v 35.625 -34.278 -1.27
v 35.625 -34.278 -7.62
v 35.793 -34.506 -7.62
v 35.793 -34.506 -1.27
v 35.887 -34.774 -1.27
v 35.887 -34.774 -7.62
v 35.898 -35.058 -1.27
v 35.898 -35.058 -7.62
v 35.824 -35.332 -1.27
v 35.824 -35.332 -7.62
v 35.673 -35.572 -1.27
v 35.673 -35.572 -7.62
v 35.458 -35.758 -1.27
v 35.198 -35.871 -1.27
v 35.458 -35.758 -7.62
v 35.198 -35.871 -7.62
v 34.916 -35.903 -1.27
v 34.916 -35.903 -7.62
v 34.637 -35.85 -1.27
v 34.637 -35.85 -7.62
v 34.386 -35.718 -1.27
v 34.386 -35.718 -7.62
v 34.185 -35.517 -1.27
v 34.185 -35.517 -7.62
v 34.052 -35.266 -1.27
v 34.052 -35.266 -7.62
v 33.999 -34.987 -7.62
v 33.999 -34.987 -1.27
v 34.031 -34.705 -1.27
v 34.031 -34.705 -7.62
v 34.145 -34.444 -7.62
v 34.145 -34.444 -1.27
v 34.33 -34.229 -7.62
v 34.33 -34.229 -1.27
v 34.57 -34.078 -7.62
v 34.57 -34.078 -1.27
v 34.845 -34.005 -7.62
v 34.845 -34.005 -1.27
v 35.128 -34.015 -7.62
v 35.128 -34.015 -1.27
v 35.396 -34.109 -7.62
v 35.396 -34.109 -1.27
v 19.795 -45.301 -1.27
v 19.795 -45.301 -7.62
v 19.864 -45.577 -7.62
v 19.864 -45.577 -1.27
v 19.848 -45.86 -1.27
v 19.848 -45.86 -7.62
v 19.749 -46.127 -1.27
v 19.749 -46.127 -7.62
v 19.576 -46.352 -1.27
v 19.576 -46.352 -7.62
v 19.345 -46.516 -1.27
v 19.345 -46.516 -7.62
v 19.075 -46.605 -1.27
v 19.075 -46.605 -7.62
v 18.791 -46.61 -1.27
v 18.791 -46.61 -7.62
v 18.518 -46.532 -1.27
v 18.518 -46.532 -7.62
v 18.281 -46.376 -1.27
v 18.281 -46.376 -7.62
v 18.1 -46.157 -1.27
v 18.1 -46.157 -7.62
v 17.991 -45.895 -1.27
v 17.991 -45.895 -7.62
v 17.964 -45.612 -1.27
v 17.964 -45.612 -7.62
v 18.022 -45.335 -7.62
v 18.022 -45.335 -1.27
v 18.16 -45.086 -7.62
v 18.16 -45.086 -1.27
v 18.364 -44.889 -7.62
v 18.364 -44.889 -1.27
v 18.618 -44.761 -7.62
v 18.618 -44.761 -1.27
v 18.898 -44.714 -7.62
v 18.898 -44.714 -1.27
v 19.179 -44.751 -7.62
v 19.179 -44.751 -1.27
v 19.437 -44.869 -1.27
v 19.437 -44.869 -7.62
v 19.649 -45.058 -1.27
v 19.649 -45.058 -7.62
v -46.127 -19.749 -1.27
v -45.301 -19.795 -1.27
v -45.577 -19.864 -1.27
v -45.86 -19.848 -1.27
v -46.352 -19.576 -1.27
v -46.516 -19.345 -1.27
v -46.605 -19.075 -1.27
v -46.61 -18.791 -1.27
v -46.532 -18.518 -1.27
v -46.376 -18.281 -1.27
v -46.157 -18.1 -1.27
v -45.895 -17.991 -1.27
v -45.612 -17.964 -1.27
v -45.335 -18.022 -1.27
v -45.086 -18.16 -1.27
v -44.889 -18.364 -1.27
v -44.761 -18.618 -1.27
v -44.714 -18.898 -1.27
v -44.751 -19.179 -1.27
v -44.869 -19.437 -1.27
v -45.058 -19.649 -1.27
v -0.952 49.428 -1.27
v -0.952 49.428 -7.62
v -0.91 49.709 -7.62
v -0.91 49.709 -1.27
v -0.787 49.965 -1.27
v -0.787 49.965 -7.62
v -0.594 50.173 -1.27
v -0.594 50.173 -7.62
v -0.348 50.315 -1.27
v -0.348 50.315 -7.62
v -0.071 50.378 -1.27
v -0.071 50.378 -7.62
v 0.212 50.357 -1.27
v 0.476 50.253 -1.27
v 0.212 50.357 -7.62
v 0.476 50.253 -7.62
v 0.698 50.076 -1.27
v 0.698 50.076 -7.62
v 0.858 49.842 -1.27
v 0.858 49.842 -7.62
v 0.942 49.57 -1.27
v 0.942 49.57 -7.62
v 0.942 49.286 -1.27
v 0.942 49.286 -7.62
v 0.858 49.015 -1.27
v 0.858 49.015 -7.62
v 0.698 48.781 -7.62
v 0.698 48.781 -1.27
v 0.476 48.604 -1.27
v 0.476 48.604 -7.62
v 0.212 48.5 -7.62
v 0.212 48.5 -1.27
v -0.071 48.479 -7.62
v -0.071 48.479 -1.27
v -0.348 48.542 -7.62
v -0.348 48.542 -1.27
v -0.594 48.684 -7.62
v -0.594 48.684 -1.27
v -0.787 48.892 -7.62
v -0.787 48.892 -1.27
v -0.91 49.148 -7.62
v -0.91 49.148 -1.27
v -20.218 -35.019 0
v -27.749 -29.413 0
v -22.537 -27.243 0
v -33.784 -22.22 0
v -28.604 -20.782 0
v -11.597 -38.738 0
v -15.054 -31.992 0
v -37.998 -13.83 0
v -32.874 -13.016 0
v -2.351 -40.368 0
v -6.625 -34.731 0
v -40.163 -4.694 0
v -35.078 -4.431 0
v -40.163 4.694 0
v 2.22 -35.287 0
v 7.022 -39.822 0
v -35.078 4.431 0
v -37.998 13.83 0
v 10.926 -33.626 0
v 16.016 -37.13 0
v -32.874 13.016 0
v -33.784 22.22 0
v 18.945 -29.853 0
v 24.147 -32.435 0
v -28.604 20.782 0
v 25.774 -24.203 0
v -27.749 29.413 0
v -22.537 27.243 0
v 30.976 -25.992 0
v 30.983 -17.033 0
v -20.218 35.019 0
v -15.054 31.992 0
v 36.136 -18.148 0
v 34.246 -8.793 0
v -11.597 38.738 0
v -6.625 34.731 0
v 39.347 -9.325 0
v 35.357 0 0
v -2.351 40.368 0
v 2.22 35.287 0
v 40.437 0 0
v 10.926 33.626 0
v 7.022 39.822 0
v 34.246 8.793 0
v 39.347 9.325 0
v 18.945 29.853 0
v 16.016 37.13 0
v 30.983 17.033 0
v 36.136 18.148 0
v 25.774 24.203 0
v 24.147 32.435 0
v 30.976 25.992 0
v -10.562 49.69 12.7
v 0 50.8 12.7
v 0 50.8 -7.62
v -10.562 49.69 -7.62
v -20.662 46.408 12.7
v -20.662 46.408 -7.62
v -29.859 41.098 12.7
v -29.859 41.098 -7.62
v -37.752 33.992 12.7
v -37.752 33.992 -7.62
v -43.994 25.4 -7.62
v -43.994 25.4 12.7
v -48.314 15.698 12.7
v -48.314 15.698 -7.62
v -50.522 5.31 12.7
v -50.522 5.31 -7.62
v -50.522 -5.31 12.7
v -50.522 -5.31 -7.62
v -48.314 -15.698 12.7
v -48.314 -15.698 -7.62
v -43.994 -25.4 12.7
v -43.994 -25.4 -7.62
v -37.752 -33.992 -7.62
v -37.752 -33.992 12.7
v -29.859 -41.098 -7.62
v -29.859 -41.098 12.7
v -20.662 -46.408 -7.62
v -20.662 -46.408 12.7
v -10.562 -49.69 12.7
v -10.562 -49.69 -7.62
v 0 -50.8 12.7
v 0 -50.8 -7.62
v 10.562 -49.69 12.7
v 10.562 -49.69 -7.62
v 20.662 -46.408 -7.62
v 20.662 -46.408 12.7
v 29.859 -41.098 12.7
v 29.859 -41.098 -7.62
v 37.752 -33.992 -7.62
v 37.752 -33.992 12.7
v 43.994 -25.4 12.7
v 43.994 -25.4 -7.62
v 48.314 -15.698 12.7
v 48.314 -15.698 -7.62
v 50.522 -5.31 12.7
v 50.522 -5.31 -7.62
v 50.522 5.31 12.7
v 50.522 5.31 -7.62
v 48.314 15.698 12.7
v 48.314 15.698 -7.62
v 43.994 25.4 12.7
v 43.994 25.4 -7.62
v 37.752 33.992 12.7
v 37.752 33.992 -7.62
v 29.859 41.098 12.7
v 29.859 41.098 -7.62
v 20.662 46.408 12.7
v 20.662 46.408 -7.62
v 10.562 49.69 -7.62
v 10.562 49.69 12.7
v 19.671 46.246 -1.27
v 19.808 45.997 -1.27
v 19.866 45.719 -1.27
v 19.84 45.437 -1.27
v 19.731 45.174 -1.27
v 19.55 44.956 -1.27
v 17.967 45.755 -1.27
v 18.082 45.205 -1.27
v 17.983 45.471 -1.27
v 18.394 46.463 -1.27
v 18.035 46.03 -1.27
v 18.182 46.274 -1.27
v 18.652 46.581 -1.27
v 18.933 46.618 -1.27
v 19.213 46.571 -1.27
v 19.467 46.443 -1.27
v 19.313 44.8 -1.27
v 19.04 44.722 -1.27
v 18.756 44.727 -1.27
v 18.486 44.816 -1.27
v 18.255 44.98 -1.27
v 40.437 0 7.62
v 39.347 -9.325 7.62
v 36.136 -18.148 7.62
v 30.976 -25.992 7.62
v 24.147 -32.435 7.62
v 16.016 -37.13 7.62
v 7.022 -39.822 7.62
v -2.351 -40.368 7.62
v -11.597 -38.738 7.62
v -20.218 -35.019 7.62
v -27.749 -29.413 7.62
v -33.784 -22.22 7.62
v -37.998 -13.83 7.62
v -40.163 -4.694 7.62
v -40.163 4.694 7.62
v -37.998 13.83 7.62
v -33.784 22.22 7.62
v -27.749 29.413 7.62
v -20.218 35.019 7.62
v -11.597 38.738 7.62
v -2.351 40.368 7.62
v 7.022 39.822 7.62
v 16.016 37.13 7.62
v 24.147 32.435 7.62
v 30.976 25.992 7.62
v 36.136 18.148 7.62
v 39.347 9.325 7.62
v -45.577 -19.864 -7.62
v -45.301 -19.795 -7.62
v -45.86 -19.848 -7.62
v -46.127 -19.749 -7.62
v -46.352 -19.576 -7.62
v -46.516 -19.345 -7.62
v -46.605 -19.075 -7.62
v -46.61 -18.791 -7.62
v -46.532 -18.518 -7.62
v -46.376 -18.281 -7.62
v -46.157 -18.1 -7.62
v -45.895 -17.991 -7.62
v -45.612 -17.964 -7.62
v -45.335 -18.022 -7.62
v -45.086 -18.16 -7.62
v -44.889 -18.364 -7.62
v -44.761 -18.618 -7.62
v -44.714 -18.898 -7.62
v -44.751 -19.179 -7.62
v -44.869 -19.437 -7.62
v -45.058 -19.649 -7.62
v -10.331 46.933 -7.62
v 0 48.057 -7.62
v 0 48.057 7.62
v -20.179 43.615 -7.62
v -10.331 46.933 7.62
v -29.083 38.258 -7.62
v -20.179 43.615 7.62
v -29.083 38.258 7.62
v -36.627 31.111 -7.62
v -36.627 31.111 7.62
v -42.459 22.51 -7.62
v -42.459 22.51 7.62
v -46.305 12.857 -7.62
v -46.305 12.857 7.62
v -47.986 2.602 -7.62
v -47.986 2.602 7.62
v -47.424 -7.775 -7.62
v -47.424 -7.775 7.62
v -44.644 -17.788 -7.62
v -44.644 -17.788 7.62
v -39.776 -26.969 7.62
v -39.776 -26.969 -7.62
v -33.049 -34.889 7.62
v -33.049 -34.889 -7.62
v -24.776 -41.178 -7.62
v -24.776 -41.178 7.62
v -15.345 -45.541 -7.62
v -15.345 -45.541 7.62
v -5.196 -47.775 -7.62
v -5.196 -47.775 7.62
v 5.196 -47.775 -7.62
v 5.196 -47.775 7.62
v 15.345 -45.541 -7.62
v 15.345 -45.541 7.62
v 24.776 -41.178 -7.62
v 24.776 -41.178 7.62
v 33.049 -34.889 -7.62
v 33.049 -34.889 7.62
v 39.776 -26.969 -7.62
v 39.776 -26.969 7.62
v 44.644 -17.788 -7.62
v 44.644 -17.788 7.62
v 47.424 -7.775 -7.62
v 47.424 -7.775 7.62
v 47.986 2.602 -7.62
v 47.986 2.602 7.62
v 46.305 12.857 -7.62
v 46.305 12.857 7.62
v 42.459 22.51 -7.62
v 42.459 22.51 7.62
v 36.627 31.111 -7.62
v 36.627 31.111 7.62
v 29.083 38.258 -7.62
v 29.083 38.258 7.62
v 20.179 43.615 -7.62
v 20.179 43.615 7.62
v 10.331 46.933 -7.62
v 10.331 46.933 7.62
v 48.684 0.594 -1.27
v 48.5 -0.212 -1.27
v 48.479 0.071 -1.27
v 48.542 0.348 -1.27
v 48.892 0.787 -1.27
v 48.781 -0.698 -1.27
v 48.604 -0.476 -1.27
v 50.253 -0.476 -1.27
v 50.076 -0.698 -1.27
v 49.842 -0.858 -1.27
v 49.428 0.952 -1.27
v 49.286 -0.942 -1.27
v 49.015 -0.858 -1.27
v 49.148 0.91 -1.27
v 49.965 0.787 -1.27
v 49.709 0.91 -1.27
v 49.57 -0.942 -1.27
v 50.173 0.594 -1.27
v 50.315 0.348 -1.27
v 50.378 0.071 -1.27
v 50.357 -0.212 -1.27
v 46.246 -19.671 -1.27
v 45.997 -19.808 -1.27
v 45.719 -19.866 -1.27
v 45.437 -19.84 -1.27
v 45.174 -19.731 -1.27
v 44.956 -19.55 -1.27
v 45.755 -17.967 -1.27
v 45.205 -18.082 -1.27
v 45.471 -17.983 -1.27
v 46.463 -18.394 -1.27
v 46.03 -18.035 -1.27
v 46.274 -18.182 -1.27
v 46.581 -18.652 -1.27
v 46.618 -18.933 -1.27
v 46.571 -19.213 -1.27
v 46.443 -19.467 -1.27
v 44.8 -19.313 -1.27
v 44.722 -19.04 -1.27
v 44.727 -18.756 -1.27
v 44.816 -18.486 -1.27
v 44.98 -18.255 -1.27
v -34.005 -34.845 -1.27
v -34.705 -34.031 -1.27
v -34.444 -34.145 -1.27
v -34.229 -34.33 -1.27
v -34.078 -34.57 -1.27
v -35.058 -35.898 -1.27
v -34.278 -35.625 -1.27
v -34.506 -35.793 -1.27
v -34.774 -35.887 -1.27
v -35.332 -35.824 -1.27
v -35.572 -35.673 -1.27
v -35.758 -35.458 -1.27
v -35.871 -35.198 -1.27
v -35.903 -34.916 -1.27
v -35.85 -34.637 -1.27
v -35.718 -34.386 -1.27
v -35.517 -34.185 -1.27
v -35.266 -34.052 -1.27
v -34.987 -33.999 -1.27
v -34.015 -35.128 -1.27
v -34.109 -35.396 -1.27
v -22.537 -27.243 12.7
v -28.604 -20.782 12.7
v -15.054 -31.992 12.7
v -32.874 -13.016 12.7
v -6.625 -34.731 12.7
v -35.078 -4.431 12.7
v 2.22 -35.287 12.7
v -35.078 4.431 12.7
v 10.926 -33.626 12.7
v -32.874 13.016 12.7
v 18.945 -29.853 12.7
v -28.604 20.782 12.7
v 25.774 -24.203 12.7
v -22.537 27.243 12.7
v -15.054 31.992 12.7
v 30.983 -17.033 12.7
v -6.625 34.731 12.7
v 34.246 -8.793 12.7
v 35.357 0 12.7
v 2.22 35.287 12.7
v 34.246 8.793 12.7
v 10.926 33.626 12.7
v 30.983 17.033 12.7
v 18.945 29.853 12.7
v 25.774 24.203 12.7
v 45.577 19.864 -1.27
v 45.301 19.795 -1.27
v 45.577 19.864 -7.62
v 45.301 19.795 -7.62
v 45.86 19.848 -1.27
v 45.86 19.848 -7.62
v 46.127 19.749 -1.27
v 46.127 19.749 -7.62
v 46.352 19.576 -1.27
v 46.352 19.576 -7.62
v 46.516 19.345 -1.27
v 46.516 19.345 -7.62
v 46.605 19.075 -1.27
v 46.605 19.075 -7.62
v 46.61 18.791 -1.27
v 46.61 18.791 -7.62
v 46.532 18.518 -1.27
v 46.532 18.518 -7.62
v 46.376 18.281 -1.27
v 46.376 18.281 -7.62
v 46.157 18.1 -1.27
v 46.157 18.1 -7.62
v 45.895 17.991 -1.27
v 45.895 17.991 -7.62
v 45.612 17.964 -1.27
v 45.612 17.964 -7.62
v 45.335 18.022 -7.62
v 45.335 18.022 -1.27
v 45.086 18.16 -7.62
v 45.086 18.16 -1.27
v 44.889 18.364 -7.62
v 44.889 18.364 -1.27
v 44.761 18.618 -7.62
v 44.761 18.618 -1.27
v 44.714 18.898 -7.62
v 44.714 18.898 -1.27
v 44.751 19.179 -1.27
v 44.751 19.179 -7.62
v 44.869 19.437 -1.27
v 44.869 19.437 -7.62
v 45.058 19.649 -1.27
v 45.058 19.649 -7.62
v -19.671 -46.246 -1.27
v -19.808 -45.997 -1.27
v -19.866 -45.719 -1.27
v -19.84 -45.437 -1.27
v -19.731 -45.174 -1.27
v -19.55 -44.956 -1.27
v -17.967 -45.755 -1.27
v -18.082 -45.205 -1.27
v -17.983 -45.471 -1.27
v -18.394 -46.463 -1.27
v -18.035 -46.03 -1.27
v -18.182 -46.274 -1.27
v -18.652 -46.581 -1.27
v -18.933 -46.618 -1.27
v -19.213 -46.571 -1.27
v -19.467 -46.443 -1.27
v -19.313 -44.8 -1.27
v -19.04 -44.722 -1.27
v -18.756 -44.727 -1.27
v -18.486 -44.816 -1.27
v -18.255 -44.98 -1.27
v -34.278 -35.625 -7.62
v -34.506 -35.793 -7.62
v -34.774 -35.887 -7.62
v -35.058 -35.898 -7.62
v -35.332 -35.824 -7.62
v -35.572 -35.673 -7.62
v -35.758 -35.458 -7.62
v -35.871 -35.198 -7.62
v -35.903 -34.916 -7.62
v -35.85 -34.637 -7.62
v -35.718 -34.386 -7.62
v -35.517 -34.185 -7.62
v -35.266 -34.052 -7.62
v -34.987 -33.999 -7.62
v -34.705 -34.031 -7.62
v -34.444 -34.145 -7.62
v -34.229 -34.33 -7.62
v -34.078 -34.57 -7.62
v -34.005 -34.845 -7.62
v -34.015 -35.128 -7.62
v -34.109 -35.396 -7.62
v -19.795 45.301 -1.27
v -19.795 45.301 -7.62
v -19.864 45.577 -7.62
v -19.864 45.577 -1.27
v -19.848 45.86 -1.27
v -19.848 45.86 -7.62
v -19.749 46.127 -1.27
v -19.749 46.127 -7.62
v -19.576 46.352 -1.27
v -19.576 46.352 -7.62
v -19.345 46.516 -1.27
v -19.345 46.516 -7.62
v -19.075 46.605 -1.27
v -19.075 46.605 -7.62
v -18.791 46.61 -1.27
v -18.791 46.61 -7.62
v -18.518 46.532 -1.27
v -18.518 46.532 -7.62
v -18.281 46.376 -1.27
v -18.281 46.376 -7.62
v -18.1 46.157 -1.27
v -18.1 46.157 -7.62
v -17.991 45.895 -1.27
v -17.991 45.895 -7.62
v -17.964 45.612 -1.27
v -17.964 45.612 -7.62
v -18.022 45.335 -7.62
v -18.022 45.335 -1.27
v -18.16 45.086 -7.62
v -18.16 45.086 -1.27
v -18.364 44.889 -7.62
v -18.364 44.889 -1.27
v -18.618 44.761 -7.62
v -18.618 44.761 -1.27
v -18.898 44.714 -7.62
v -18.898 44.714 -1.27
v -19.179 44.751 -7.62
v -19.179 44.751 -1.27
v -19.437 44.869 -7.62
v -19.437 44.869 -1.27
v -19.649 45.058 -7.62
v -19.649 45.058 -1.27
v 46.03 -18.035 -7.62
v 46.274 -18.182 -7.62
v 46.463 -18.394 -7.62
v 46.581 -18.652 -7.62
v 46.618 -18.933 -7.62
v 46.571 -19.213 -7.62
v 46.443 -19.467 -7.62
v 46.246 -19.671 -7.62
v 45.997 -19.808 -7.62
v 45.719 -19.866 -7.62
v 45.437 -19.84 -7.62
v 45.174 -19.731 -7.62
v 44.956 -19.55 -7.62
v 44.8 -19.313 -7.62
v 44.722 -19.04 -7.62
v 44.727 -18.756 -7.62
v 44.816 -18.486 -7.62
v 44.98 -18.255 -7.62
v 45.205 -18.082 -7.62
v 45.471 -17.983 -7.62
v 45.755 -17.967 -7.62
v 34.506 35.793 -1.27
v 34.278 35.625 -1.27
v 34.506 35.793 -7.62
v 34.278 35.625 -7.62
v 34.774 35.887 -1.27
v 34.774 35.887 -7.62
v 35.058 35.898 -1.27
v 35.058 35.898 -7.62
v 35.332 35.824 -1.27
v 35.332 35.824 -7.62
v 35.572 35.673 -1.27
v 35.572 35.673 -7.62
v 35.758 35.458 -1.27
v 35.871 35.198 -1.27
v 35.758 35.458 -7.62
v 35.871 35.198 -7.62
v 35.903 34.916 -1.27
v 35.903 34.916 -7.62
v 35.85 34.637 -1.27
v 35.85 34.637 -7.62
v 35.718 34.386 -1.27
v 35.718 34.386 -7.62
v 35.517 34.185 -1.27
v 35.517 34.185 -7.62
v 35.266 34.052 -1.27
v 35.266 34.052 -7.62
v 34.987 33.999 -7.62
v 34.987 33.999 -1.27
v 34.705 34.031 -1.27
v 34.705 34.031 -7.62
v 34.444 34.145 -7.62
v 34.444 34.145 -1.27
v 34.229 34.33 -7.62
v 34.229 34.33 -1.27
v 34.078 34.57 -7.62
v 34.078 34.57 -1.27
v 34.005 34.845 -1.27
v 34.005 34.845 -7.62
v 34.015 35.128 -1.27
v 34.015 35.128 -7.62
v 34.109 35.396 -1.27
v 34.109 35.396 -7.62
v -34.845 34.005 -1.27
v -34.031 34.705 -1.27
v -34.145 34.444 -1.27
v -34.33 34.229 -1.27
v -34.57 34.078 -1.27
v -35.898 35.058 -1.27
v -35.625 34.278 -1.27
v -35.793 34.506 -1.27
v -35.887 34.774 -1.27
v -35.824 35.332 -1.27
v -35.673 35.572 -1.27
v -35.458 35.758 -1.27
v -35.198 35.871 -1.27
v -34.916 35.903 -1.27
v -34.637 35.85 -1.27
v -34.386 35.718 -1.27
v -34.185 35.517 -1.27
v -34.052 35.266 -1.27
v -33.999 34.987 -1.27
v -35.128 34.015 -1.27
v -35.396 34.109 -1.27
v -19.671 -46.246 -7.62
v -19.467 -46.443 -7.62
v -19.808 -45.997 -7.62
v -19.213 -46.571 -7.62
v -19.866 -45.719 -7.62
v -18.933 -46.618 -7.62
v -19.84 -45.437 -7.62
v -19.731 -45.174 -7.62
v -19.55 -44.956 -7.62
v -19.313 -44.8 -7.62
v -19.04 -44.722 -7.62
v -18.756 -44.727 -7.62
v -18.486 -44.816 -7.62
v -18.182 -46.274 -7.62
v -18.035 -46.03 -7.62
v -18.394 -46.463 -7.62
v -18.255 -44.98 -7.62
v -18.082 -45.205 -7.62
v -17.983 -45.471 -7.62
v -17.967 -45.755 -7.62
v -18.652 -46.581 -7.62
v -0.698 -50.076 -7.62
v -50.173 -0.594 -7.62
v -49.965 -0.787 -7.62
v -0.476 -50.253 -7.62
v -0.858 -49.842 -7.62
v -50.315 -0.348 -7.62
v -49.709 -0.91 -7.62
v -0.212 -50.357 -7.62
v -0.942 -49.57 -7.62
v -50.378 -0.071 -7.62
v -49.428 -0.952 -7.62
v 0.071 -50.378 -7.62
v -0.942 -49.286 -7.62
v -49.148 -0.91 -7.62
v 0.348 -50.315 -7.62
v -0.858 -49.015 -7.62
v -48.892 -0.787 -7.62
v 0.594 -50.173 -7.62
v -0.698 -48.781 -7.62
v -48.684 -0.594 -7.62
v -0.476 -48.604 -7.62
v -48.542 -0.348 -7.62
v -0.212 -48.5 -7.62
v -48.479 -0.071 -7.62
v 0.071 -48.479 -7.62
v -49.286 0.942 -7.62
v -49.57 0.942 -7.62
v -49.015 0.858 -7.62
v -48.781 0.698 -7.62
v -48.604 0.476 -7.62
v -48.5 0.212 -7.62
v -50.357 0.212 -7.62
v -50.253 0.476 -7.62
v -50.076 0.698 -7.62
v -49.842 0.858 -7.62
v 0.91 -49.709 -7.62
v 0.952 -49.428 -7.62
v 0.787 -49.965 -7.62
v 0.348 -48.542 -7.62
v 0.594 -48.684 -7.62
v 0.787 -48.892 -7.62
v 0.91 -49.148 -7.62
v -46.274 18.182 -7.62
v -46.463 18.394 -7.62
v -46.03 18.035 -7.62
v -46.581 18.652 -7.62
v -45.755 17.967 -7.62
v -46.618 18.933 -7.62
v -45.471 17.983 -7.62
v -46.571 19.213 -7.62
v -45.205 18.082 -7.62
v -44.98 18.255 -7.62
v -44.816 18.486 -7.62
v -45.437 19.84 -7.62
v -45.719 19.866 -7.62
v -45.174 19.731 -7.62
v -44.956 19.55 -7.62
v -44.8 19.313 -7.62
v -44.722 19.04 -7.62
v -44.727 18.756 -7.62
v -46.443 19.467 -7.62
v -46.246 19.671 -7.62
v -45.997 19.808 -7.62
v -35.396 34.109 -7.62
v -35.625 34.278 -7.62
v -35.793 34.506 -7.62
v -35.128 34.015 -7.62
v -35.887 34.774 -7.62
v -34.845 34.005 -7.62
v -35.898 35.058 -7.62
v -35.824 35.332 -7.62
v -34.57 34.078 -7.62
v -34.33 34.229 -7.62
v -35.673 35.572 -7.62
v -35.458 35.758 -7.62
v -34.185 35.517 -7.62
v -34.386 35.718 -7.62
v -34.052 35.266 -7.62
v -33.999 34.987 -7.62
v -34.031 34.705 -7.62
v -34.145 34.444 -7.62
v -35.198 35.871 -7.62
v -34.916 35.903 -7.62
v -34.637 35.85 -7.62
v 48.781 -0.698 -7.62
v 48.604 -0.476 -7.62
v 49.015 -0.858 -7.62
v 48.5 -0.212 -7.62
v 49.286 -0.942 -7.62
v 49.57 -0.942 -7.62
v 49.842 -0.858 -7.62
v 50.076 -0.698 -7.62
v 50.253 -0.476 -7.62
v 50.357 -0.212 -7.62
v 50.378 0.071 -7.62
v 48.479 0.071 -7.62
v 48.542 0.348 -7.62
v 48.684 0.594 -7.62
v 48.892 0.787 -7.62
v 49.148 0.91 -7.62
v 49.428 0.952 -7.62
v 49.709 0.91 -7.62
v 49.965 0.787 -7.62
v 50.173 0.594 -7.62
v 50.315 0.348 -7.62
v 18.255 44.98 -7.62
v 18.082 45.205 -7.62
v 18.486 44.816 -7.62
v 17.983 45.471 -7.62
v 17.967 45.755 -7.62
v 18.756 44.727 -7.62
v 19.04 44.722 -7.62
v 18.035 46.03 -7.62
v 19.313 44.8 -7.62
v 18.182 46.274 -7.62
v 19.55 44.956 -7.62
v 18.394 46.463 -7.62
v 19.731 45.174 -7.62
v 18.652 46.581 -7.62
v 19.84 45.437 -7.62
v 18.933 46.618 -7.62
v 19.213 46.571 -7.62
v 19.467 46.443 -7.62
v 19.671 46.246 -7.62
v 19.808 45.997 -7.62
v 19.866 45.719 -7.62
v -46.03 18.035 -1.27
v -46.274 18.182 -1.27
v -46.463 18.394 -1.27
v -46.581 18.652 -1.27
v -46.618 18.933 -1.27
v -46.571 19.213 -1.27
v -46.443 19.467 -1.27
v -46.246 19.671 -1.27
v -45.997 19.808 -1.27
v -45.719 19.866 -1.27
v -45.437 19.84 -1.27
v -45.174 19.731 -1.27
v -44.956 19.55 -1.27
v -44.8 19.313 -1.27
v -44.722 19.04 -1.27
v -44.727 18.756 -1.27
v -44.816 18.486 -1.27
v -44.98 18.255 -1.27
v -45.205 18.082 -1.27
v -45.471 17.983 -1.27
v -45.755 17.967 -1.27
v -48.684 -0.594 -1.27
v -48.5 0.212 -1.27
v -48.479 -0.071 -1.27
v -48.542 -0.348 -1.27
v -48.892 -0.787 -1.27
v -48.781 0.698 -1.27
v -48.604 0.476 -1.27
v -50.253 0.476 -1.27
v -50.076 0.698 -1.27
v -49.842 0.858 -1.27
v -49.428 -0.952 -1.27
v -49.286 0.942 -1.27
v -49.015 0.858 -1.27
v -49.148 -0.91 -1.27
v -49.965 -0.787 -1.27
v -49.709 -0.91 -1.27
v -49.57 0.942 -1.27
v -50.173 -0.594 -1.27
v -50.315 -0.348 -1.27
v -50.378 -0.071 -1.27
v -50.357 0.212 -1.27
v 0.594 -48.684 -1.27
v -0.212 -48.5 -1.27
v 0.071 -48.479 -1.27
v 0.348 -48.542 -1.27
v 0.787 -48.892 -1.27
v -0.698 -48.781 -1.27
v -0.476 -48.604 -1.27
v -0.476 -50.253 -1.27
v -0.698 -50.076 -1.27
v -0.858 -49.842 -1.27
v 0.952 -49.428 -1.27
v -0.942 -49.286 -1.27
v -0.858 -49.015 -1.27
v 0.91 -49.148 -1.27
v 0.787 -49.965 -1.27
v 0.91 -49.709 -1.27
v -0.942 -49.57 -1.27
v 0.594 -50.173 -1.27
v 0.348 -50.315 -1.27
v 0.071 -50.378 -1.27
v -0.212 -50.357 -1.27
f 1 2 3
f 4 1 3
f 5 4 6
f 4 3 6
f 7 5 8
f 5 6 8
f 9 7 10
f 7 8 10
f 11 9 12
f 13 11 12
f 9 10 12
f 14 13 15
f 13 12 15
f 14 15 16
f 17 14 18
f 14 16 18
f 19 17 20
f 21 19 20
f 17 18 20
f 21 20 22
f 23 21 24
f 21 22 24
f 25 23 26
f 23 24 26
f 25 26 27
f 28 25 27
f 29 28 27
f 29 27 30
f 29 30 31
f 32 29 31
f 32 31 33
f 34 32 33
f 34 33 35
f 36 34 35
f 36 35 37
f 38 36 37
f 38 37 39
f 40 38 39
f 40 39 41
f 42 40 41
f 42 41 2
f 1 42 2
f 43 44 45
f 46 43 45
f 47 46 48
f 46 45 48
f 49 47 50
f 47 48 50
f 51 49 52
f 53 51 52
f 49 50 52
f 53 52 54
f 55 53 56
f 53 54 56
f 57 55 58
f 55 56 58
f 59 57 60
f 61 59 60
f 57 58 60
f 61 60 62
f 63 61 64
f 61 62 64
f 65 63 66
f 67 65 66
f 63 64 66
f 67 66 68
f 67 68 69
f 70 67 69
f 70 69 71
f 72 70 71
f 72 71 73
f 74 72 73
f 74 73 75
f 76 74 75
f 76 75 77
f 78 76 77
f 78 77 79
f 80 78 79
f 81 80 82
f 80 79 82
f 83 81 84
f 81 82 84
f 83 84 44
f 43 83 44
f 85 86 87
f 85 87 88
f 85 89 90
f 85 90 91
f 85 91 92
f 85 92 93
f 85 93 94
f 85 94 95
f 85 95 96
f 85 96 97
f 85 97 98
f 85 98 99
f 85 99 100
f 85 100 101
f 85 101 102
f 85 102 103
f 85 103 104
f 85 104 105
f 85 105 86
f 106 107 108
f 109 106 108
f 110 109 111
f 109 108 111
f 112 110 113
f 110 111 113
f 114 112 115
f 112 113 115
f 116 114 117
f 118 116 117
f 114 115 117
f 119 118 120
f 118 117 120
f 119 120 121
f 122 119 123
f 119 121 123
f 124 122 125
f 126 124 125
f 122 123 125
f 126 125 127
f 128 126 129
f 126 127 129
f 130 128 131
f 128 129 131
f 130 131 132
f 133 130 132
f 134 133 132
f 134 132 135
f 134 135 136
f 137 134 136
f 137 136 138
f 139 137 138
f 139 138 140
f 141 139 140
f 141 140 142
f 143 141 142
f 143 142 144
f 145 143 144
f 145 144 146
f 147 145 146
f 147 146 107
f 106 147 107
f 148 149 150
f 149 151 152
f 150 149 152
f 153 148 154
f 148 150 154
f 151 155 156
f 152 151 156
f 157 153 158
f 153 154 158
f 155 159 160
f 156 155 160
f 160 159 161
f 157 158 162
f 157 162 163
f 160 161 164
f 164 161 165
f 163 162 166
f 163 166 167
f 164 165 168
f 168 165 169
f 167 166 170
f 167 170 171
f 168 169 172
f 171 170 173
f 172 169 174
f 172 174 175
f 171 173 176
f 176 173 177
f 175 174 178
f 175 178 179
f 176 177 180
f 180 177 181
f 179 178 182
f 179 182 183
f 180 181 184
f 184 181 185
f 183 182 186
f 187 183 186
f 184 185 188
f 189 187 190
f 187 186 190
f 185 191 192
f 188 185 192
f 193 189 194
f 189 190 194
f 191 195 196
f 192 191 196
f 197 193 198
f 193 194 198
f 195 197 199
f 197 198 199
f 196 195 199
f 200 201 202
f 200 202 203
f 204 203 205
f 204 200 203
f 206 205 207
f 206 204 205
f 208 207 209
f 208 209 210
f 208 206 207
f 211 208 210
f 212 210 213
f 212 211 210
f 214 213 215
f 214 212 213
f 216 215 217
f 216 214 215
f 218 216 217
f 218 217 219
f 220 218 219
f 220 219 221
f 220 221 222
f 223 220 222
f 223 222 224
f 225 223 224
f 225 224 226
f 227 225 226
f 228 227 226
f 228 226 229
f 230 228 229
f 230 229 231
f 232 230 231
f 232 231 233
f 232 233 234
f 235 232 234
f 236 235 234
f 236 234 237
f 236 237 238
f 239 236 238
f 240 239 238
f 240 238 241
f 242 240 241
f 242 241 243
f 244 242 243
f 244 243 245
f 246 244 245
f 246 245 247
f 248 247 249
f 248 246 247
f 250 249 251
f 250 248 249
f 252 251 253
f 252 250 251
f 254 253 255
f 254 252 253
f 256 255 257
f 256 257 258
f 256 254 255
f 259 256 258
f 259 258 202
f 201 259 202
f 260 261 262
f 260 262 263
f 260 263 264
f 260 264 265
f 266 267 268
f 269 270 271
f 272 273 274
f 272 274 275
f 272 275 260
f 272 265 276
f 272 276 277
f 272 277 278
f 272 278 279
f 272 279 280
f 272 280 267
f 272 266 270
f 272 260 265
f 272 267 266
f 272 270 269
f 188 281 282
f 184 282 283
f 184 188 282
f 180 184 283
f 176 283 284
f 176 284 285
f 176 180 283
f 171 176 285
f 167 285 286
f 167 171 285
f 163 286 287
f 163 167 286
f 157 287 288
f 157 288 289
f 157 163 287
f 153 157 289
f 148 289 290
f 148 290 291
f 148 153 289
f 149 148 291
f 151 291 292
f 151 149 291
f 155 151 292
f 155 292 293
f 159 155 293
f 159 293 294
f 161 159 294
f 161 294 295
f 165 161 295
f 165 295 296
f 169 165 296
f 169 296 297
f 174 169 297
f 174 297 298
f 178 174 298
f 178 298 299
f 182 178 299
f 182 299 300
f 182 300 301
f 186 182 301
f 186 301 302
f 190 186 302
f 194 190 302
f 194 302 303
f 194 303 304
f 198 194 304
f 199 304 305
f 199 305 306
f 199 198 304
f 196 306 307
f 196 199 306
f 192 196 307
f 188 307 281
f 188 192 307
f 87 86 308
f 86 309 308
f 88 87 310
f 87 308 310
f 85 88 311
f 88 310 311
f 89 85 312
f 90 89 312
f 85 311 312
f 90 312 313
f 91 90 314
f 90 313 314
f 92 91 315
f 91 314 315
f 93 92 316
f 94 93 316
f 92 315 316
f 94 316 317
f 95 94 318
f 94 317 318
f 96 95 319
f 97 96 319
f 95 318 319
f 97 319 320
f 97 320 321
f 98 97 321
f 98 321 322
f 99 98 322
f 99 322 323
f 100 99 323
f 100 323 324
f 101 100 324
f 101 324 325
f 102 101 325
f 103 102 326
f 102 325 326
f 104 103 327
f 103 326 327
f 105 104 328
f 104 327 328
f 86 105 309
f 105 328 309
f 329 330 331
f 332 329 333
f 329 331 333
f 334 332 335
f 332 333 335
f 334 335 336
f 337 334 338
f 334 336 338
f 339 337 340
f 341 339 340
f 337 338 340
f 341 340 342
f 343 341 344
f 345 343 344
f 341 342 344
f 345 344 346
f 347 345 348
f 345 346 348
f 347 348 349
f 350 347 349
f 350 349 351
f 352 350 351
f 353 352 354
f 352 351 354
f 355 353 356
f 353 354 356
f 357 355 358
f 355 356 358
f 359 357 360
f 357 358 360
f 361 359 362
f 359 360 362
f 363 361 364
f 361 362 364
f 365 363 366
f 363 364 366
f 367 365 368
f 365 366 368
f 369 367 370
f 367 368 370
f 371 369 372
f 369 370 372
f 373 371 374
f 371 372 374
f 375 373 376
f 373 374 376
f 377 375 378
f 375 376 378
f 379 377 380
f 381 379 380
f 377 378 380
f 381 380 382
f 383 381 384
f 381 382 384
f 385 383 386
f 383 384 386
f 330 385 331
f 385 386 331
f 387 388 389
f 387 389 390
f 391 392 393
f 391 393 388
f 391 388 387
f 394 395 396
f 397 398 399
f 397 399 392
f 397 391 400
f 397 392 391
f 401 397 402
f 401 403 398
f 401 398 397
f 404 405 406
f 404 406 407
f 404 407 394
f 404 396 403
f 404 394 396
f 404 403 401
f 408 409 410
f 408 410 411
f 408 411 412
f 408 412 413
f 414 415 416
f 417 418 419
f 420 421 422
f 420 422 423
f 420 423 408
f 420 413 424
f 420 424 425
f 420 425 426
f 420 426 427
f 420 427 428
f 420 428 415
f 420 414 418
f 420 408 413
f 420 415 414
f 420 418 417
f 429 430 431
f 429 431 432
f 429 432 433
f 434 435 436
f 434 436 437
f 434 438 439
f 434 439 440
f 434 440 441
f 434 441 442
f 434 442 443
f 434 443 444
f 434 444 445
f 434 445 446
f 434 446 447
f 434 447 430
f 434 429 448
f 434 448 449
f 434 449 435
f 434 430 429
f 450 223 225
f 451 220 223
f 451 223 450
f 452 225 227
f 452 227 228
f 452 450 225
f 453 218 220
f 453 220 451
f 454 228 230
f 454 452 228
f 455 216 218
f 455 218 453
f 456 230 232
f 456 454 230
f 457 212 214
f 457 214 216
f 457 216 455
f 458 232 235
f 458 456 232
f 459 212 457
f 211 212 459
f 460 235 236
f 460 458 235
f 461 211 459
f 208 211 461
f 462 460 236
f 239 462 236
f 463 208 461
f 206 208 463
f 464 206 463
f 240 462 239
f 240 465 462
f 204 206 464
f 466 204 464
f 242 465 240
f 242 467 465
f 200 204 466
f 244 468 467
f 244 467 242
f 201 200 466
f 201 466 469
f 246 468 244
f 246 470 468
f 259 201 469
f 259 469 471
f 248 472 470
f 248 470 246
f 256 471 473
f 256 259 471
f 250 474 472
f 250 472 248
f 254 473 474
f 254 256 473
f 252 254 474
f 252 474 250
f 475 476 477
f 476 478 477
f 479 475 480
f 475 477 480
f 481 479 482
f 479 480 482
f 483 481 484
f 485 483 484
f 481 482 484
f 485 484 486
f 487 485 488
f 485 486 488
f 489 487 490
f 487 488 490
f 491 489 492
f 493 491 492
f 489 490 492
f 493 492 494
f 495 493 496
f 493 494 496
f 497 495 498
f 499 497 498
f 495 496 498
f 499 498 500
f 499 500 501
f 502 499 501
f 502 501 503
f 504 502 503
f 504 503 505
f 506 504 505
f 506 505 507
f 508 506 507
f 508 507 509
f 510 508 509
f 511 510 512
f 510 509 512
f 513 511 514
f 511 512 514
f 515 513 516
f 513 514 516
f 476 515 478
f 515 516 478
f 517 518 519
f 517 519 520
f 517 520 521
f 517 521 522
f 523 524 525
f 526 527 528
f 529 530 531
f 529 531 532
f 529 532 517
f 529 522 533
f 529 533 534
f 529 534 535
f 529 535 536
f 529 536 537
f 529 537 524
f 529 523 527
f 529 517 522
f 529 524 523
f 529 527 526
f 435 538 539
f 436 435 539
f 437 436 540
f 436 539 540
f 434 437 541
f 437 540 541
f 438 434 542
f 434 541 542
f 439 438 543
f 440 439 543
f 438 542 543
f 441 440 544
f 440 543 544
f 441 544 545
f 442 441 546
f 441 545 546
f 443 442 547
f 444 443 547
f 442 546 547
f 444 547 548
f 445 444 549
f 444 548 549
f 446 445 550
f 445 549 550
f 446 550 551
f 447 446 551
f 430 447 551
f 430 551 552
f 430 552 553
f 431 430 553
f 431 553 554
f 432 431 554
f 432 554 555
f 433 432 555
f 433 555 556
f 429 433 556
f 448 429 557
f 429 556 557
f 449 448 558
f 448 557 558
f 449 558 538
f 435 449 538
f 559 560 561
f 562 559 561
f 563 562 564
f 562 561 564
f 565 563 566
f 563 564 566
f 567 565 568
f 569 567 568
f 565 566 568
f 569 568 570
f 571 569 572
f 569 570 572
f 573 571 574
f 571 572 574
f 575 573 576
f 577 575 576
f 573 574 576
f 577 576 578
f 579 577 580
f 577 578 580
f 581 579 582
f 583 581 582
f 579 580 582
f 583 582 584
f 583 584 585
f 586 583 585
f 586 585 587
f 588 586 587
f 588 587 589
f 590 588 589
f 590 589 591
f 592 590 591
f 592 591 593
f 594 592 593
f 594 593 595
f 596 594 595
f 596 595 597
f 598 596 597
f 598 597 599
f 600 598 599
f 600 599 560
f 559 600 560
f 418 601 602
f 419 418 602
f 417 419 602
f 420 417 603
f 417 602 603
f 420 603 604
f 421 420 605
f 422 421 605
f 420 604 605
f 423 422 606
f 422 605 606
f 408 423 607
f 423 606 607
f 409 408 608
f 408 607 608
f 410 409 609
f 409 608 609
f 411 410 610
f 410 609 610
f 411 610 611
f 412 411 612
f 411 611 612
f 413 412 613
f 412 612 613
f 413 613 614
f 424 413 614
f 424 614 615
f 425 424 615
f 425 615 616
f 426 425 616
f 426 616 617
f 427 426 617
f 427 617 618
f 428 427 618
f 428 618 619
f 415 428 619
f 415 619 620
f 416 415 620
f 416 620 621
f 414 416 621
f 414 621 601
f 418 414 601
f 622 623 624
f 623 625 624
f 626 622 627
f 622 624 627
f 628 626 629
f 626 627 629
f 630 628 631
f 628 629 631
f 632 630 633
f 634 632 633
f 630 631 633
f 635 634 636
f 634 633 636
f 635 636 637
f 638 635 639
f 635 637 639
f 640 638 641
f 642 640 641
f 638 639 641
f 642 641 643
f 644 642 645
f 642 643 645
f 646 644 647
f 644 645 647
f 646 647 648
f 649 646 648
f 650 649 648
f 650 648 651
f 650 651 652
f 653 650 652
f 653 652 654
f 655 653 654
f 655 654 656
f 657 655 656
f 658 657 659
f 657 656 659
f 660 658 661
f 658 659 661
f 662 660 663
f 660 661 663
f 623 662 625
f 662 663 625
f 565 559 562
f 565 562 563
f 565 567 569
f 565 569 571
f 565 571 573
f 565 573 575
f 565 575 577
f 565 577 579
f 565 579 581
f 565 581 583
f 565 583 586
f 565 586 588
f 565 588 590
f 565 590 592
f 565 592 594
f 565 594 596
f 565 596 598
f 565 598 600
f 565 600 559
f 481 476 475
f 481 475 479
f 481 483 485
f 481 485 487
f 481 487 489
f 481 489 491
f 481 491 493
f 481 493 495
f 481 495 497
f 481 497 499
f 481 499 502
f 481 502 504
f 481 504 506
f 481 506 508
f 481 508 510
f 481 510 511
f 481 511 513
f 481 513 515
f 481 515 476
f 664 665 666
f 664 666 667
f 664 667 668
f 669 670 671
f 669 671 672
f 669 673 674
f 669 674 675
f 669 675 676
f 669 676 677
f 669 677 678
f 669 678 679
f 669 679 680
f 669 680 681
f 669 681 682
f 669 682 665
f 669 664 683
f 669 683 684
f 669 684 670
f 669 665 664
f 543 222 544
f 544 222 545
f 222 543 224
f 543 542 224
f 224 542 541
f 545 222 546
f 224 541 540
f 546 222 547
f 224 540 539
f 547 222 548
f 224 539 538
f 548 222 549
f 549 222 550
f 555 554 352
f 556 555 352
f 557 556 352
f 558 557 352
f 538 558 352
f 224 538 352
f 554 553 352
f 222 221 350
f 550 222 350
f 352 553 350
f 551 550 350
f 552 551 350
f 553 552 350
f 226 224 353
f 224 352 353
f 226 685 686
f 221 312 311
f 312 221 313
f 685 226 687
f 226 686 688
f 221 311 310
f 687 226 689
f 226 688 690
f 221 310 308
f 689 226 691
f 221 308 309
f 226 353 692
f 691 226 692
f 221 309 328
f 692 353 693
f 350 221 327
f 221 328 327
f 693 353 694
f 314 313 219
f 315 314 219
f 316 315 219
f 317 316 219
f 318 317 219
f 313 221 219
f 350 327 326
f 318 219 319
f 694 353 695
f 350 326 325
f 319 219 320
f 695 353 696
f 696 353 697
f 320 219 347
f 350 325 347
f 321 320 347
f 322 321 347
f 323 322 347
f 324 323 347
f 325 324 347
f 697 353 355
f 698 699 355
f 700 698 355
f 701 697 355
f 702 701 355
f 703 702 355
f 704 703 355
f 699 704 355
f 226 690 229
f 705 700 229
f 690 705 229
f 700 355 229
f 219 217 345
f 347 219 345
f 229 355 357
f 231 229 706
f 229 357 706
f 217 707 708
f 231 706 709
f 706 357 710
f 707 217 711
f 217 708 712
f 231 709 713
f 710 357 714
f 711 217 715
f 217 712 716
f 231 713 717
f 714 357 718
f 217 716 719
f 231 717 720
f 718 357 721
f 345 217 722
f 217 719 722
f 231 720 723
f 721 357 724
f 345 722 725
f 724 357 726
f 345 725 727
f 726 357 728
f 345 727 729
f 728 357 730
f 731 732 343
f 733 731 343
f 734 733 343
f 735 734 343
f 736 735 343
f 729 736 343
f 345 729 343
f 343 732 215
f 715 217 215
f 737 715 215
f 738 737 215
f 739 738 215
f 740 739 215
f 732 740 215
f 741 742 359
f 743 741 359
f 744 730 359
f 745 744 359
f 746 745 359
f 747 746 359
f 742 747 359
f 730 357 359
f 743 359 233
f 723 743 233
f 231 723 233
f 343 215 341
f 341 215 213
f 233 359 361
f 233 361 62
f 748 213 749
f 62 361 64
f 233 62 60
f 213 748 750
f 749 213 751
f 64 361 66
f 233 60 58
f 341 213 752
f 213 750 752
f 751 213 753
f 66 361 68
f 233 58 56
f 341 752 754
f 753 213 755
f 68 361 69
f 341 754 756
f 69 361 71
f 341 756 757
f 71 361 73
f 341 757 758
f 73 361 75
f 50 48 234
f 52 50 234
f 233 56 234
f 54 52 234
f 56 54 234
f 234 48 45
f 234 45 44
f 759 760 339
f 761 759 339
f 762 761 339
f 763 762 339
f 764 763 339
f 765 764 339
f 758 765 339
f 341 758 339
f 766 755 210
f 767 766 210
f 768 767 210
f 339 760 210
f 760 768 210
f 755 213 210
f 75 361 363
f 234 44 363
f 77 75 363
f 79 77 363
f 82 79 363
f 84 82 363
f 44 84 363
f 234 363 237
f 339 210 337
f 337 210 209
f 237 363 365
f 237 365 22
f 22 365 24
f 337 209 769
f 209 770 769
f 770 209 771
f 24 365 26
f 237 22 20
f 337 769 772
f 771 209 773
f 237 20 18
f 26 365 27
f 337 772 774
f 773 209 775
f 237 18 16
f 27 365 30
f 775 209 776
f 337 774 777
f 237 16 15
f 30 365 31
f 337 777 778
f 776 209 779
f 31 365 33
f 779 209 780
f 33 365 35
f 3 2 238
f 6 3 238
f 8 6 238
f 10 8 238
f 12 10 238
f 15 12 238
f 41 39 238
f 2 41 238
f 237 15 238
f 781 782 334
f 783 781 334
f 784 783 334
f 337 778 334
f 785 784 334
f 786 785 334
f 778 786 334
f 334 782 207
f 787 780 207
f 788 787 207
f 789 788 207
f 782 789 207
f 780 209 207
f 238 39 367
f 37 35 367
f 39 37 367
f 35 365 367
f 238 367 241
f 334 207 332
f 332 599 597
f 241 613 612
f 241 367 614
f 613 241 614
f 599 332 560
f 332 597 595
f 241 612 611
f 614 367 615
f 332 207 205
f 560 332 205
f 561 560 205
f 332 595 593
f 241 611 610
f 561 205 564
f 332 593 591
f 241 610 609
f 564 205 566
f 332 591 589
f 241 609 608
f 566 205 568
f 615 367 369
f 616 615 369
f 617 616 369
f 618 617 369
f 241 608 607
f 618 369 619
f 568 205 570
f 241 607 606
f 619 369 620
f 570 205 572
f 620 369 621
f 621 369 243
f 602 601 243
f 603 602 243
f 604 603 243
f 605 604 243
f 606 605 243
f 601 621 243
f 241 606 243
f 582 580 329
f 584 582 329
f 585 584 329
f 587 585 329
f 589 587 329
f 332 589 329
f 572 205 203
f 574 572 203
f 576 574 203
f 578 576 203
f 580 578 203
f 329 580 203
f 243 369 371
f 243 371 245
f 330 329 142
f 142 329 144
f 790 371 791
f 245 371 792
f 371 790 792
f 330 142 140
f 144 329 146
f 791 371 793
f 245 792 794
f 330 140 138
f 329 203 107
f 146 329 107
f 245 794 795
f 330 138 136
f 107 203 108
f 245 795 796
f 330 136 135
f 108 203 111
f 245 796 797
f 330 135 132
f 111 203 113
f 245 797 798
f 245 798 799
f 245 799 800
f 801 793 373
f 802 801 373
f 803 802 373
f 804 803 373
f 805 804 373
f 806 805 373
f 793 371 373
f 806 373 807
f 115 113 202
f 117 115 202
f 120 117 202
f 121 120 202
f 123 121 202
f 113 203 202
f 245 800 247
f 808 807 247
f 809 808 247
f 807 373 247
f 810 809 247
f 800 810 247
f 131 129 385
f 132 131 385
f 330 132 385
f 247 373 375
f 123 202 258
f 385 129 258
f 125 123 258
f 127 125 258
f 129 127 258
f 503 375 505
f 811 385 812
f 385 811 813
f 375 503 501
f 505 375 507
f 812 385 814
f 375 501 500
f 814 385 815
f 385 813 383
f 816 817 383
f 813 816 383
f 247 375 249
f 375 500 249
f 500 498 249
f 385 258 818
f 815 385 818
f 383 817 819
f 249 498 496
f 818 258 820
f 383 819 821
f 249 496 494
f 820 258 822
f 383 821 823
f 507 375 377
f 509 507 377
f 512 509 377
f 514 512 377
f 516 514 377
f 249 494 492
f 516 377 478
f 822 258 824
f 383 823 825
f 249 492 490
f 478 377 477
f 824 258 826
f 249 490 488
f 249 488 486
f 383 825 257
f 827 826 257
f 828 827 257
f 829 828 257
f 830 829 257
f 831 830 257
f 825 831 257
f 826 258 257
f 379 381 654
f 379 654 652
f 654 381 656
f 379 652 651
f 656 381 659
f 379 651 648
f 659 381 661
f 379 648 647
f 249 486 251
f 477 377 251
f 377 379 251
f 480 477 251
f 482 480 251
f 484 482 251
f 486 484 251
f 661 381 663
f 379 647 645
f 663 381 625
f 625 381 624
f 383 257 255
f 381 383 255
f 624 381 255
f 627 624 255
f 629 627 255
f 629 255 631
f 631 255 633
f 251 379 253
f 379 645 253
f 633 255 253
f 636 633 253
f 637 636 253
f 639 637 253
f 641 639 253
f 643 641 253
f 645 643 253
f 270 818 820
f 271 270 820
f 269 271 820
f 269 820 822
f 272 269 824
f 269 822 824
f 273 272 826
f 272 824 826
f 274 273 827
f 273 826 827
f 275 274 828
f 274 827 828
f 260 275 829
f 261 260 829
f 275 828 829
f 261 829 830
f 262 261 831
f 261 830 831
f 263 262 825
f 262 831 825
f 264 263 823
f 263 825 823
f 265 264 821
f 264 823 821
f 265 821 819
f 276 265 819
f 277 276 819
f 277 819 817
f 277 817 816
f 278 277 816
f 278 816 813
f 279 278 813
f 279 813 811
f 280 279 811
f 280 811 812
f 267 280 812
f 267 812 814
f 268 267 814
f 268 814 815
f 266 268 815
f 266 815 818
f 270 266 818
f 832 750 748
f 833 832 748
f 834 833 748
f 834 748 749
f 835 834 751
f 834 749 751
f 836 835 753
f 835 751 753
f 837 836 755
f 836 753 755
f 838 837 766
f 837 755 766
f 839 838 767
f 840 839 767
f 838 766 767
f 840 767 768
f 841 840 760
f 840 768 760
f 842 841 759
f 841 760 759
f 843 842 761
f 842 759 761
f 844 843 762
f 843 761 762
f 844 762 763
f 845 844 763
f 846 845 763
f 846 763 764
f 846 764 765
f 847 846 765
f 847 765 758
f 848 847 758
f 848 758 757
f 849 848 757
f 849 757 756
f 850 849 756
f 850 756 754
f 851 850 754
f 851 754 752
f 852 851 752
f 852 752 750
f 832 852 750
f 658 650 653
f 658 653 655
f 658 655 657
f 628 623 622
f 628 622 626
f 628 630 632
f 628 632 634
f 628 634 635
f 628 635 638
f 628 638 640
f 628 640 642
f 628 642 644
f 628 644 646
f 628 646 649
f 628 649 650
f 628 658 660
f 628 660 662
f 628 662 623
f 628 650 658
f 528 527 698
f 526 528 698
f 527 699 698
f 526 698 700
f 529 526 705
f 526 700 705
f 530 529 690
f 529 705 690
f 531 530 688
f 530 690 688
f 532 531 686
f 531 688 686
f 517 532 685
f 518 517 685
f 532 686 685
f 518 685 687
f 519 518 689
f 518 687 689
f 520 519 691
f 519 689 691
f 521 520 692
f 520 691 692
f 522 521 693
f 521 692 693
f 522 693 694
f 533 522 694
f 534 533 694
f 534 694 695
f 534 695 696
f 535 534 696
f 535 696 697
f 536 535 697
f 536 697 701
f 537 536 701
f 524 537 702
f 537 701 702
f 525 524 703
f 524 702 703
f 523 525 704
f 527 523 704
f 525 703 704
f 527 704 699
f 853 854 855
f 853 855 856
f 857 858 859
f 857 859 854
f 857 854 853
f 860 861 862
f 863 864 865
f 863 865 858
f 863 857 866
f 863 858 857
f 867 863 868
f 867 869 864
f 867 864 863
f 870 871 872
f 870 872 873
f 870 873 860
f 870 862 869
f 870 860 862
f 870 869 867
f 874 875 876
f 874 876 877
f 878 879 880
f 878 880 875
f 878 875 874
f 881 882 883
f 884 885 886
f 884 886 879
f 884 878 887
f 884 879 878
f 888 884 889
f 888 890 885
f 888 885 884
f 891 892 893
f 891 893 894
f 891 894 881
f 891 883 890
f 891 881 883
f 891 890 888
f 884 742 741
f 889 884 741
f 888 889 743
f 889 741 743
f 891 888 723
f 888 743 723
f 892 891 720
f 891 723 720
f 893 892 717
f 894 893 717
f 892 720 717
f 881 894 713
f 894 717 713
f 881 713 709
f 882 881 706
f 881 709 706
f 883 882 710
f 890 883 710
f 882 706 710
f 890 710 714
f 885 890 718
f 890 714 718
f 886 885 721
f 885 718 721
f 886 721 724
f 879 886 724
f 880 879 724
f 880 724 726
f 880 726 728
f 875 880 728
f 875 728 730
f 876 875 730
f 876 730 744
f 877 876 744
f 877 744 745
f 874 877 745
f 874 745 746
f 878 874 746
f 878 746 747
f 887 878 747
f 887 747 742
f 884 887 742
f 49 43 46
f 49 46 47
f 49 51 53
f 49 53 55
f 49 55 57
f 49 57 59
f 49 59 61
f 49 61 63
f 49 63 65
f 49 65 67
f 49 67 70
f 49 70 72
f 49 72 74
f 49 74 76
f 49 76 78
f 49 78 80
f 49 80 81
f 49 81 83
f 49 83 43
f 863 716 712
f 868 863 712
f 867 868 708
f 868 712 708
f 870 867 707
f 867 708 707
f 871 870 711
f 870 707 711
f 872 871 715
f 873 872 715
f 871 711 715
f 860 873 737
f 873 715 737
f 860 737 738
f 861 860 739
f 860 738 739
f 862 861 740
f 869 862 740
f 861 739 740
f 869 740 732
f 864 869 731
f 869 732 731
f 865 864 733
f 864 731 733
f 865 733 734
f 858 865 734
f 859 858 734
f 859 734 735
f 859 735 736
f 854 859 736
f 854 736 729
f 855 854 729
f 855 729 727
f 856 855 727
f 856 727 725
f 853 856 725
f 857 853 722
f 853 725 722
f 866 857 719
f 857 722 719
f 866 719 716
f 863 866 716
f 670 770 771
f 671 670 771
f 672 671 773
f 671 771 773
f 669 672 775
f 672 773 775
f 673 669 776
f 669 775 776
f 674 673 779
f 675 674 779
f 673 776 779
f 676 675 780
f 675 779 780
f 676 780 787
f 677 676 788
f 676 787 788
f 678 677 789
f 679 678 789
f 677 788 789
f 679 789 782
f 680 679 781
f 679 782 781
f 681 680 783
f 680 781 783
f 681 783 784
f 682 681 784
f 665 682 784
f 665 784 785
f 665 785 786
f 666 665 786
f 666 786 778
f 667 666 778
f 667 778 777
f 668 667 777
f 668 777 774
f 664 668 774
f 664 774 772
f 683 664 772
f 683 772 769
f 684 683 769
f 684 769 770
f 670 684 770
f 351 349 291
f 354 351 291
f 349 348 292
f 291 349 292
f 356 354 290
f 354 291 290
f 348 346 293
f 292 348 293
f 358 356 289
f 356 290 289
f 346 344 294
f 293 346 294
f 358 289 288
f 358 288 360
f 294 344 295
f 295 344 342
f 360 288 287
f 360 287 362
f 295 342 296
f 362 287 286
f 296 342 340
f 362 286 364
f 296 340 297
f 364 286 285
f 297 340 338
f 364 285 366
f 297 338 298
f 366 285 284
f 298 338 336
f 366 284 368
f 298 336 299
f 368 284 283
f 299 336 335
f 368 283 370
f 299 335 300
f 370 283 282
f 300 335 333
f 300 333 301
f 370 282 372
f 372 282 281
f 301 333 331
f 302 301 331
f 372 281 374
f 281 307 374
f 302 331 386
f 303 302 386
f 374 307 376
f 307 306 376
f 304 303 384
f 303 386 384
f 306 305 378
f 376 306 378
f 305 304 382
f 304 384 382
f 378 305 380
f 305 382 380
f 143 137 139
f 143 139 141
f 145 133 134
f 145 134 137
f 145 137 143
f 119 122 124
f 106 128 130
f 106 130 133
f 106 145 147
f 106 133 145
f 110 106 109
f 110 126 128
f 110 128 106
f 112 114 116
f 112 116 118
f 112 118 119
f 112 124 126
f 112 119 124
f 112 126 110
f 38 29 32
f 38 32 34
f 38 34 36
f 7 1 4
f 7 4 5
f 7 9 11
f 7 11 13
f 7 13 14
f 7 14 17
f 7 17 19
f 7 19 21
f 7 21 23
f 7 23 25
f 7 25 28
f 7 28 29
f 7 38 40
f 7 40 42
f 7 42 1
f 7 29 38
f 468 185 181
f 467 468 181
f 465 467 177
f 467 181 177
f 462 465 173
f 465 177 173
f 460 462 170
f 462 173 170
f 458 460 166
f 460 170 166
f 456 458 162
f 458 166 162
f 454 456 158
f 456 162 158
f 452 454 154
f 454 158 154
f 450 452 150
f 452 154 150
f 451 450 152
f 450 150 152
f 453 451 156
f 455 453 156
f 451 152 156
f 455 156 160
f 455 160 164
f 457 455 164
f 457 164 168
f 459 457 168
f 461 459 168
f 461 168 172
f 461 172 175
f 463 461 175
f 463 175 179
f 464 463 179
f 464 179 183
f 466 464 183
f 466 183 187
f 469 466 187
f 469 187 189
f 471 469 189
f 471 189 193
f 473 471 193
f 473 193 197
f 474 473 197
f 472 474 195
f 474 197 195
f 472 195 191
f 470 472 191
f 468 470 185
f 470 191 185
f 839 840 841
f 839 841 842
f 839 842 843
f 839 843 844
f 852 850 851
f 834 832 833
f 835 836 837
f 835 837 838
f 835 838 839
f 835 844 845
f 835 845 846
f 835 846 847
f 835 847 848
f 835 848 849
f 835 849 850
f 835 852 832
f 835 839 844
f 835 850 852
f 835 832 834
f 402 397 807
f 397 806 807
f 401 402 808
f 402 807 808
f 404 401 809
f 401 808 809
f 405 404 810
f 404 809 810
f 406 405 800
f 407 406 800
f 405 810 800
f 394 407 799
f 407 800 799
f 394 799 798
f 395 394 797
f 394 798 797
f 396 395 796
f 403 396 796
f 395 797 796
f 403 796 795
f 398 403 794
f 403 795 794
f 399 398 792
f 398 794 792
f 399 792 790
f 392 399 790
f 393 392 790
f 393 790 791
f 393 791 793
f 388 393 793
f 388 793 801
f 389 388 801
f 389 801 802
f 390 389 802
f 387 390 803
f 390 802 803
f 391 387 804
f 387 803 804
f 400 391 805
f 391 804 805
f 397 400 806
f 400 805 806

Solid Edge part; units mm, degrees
sketch "Sketch1" plane through (0, 0, 0) normal (0, 0, 1) x (1, 0, 0)
  circle A0 centre (0, 0) radius 35.3568
  circle A1 centre (0, 0) radius 40.4368
  dimension "D1" = 70.7136
  dimension "D2" = 80.8736
extrude "Protrusion1" add sketch "Sketch1" along normal blind 12.7
sketch "Sketch2" plane through (0, 0, 12.7) normal (0, 0, 1) x (0, 1, 0)
  circle A0 centre (0, 0) radius 50.8
extrude "ExtrudedProtrusion_2" add sketch "Sketch2" against normal blind 5.08
sketch "Sketch3" plane through (0, 0, 12.7) normal (0, 0, 1) x (0, 1, 0)
  circle A0 centre (0, 0) radius 48.0568
  circle A1 centre (0, 0) radius 50.8
  dimension "D1" = 101.6
  dimension "D2" = 96.1136
extrude "ExtrudedProtrusion_3" add sketch "Sketch3" against normal blind 20.32
sketch "Sketch4" plane through (0, 0, 0) normal (0, 0, 1) x (1, 0, 0)
  circle A0 centre (0, 0) radius 35.3568
extrude "Cutout1" cut sketch "Sketch4" along normal up to next
sketch "Sketch5" plane through (0, 0, -7.62) normal (0, 0, -1) x (-1, 0, 0)
  circle A0 centre (0, 49.4284) radius 0.9525
extrude "ExtrudedCutout_2" cut sketch "Sketch5" against normal blind 6.35
pattern_circular "Pattern_1" count 16 over 360 about axis through (0, 0, 0) along (0, 0, -1) of "ExtrudedCutout_2"
